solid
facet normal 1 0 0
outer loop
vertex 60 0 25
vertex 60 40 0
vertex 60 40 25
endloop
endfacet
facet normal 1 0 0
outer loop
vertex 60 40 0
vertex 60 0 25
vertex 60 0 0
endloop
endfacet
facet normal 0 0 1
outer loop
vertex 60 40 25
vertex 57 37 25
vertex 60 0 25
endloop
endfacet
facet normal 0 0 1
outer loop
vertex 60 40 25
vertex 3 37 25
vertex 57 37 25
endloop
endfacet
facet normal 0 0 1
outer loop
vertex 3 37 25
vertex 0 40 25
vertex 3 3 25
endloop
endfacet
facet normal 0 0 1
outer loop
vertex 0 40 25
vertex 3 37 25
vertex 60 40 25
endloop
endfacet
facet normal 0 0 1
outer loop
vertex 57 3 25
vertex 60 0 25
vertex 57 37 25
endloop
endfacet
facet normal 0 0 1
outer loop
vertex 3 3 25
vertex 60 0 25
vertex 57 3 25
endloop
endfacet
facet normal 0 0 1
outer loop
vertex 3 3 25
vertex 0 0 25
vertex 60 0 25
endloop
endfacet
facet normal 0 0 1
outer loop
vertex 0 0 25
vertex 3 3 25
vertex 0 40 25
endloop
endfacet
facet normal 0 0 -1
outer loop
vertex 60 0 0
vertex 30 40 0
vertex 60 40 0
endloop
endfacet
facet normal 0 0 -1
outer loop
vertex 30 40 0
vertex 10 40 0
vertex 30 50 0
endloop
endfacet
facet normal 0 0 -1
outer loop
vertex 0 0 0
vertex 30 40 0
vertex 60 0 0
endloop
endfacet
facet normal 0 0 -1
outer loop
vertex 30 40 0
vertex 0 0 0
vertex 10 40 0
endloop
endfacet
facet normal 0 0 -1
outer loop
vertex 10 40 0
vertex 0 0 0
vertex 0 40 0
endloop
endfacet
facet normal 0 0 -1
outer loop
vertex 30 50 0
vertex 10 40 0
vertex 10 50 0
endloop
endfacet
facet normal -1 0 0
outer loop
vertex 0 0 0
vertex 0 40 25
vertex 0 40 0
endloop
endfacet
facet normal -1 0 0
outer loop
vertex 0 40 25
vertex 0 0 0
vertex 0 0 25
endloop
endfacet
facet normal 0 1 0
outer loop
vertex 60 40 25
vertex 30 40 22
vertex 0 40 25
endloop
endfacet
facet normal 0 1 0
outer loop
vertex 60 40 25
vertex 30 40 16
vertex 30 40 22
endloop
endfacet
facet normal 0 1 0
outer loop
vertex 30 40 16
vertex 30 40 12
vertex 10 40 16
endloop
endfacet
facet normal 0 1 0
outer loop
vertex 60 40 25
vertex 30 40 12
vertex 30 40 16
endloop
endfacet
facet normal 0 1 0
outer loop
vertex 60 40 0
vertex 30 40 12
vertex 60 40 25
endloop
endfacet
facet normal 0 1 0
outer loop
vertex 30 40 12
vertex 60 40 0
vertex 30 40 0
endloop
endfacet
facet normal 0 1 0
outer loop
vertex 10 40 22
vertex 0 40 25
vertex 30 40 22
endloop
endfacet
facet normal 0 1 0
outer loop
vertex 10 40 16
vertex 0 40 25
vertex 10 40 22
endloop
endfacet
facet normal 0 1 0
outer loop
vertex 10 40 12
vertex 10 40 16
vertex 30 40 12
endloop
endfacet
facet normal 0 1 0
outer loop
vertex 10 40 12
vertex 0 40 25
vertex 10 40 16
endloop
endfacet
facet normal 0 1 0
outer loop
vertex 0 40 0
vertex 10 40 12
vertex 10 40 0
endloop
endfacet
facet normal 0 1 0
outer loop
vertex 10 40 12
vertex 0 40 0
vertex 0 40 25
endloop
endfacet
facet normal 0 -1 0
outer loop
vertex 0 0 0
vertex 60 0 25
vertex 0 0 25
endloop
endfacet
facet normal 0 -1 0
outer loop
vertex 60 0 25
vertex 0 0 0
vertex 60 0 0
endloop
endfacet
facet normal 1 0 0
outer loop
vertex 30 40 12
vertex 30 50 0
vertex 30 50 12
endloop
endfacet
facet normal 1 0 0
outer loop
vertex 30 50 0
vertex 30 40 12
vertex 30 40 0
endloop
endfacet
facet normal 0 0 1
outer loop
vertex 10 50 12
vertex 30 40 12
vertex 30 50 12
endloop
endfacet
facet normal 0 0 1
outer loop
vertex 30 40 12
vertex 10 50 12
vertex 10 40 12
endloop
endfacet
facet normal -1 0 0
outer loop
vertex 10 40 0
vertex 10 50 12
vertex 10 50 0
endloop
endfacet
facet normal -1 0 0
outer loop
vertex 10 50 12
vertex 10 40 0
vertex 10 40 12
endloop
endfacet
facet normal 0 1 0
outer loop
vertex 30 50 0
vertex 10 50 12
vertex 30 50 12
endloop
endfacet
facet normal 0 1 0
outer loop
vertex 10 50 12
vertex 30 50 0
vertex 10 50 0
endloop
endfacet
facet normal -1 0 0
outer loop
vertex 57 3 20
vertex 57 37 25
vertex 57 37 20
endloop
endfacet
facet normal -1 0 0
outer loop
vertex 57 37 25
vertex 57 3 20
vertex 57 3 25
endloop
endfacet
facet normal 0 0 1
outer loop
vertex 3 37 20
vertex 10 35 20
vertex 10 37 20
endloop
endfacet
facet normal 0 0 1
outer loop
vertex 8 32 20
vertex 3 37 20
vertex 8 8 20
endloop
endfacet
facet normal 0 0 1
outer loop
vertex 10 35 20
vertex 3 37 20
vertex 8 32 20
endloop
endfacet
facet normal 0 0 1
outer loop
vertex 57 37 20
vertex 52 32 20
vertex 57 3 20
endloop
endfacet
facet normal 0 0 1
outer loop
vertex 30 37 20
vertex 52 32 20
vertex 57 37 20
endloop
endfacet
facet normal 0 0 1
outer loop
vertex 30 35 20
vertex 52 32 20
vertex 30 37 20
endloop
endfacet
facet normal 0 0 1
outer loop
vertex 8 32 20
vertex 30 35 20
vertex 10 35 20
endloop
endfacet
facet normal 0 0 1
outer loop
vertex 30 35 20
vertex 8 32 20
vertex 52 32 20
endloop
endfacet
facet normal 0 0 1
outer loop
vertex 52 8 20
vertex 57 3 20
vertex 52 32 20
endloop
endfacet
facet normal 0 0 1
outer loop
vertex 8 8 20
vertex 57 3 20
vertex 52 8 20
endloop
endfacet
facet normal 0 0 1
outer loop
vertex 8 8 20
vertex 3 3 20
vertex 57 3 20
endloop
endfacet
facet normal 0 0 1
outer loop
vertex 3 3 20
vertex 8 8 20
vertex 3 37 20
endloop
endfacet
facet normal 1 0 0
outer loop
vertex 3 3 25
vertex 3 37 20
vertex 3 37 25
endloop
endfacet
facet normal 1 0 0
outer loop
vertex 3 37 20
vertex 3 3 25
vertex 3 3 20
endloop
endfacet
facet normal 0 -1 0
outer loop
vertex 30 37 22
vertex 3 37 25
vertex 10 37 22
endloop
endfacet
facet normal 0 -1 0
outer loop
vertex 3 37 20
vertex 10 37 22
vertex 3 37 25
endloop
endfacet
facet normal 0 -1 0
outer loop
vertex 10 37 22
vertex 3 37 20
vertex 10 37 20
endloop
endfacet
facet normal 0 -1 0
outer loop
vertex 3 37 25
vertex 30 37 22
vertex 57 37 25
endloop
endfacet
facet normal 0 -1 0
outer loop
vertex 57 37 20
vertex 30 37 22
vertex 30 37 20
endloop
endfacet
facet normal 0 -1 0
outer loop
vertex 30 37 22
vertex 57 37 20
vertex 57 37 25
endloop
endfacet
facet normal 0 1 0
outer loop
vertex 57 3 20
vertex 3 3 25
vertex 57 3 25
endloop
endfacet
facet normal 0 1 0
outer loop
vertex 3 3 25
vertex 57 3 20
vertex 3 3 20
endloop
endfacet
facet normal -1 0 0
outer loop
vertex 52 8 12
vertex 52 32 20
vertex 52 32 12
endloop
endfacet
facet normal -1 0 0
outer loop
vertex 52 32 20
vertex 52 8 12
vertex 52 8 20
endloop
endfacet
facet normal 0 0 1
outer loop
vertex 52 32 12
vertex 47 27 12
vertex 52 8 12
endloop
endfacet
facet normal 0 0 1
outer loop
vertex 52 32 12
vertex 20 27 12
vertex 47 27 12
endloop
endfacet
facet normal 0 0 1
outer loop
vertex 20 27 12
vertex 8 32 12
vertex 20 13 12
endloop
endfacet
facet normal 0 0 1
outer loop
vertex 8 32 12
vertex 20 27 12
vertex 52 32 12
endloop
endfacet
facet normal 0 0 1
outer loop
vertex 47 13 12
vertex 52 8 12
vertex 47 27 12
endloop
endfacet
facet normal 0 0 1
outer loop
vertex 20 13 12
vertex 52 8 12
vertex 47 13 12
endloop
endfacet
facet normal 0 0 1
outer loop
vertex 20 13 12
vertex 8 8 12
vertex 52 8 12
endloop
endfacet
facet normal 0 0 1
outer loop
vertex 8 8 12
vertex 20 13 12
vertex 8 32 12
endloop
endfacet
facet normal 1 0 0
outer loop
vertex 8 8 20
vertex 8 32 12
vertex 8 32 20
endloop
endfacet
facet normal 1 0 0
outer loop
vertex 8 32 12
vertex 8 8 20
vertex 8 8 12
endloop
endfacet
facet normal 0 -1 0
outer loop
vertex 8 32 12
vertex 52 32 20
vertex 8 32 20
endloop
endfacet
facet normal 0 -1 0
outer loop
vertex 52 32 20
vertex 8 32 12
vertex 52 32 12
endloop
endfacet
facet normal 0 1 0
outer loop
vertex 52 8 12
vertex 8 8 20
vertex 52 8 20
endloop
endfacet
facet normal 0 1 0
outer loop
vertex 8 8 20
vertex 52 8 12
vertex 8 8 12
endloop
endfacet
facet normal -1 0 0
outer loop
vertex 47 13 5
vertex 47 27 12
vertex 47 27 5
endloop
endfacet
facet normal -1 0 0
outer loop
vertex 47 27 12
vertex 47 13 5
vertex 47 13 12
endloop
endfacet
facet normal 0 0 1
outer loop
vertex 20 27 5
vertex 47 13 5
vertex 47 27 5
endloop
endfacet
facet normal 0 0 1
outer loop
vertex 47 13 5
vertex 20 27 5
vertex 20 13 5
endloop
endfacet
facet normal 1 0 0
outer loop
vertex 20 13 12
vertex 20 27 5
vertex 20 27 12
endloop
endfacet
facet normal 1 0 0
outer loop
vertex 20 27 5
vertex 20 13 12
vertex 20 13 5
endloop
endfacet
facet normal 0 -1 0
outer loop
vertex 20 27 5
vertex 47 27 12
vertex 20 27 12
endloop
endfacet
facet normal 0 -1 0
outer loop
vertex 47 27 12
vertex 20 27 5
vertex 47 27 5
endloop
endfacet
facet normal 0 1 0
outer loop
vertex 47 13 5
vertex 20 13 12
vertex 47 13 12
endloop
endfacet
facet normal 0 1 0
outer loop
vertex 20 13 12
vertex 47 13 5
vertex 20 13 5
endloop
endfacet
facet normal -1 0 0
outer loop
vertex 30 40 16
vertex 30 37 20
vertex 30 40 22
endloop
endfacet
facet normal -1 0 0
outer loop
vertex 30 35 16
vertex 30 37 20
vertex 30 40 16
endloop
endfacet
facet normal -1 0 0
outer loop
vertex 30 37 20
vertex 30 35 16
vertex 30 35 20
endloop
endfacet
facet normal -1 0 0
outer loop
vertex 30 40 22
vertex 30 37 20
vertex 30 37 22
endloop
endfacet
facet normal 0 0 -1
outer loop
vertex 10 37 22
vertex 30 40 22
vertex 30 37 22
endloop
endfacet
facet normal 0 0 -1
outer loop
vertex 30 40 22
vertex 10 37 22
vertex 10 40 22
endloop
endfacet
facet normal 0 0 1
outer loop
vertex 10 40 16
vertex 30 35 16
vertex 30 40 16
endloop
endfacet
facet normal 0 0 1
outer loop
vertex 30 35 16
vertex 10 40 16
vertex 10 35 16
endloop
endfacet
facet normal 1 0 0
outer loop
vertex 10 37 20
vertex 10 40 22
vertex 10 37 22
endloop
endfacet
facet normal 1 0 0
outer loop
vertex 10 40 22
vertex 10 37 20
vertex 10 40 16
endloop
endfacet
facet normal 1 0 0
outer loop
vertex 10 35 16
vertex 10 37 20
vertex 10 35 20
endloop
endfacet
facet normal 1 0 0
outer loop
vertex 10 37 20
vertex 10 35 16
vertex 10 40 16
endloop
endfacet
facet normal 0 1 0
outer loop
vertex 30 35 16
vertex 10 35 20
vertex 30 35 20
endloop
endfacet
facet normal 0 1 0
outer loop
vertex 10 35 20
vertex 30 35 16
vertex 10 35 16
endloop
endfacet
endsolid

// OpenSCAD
// === Parametric Variables ===

// Main body dimensions
body_width  = 60;   // X axis
body_depth  = 40;   // Y axis
body_height = 25;   // Z axis

// Top cavity - Level 1: upper recess (surrounded by thin rim)
rim_thickness       = 3;   // rim on all four sides
upper_recess_depth  = 5;   // depth of the topmost recess

// Top cavity - Level 2: middle recess (inset further)
middle_extra_inset = 5;    // additional inset beyond upper recess
middle_recess_depth = 8;   // depth of the middle step

// Top cavity - Level 3: deep pocket (shifted, creating uneven ledges)
deep_extra_inset   = 5;    // additional inset beyond middle recess
deep_pocket_depth  = 7;    // depth of the deepest pocket
deep_pocket_x_shift = 7;   // X offset shifting the deep pocket to one side

// Side projection (added rectangular solid along +Y face)
proj_width   = 20;   // X size of projection
proj_extend  = 10;   // how far the projection extends in +Y
proj_height  = 12;   // Z height of projection from the base
proj_x_pos   = 10;   // X position of projection on the side wall

// Side recess (cut into +Y wall above the projection)
srecess_width  = 20;  // X size
srecess_depth  = 5;   // how far it cuts into the body (-Y direction)
srecess_height = 6;   // Z size of the side recess
srecess_x_pos  = 10;  // X position (aligned with projection)
srecess_z_pos  = 16;  // Z position (above the projection top)

$fn = 60;

// === Helper: computed cavity dimensions ===
upper_w = body_width  - 2 * rim_thickness;
upper_d = body_depth  - 2 * rim_thickness;
middle_w = upper_w - 2 * middle_extra_inset;
middle_d = upper_d - 2 * middle_extra_inset;
deep_w  = middle_w - 2 * deep_extra_inset - deep_pocket_x_shift;
deep_d  = middle_d - 2 * deep_extra_inset;

// X start for the shifted deep pocket (shifted toward +X)
deep_x_start = rim_thickness + middle_extra_inset + deep_extra_inset + deep_pocket_x_shift;
deep_y_start = rim_thickness + middle_extra_inset + deep_extra_inset;

// Z levels (measured from bottom)
upper_z_start  = body_height - upper_recess_depth;
middle_z_start = upper_z_start - middle_recess_depth;
deep_z_start   = middle_z_start - deep_pocket_depth;

// === Main Model ===

difference() {
    // --- Solid volume: body + side projection ---
    union() {
        // Primary rectangular body
        cube([body_width, body_depth, body_height]);

        // Rectangular projection along the +Y side
        translate([proj_x_pos, body_depth, 0])
            cube([proj_width, proj_extend, proj_height]);
    }

    // --- Subtractive features: stepped cavity + side recess ---

    // Level 1: broad upper recess with thin rim
    translate([rim_thickness, rim_thickness, upper_z_start])
        cube([upper_w, upper_d, upper_recess_depth + 0.1]);

    // Level 2: narrower middle recess, inset further on all sides
    translate([
        rim_thickness + middle_extra_inset,
        rim_thickness + middle_extra_inset,
        middle_z_start
    ])
        cube([middle_w, middle_d, middle_recess_depth + 0.1]);

    // Level 3: deepest pocket, shifted in +X creating uneven interior ledges
    translate([deep_x_start, deep_y_start, deep_z_start])
        cube([deep_w, deep_d, deep_pocket_depth + 0.1]);

    // Side recess above the projection: a stepped cut into the +Y wall
    translate([srecess_x_pos, body_depth - srecess_depth, srecess_z_pos])
        cube([srecess_width, srecess_depth + 0.1, srecess_height]);
}
